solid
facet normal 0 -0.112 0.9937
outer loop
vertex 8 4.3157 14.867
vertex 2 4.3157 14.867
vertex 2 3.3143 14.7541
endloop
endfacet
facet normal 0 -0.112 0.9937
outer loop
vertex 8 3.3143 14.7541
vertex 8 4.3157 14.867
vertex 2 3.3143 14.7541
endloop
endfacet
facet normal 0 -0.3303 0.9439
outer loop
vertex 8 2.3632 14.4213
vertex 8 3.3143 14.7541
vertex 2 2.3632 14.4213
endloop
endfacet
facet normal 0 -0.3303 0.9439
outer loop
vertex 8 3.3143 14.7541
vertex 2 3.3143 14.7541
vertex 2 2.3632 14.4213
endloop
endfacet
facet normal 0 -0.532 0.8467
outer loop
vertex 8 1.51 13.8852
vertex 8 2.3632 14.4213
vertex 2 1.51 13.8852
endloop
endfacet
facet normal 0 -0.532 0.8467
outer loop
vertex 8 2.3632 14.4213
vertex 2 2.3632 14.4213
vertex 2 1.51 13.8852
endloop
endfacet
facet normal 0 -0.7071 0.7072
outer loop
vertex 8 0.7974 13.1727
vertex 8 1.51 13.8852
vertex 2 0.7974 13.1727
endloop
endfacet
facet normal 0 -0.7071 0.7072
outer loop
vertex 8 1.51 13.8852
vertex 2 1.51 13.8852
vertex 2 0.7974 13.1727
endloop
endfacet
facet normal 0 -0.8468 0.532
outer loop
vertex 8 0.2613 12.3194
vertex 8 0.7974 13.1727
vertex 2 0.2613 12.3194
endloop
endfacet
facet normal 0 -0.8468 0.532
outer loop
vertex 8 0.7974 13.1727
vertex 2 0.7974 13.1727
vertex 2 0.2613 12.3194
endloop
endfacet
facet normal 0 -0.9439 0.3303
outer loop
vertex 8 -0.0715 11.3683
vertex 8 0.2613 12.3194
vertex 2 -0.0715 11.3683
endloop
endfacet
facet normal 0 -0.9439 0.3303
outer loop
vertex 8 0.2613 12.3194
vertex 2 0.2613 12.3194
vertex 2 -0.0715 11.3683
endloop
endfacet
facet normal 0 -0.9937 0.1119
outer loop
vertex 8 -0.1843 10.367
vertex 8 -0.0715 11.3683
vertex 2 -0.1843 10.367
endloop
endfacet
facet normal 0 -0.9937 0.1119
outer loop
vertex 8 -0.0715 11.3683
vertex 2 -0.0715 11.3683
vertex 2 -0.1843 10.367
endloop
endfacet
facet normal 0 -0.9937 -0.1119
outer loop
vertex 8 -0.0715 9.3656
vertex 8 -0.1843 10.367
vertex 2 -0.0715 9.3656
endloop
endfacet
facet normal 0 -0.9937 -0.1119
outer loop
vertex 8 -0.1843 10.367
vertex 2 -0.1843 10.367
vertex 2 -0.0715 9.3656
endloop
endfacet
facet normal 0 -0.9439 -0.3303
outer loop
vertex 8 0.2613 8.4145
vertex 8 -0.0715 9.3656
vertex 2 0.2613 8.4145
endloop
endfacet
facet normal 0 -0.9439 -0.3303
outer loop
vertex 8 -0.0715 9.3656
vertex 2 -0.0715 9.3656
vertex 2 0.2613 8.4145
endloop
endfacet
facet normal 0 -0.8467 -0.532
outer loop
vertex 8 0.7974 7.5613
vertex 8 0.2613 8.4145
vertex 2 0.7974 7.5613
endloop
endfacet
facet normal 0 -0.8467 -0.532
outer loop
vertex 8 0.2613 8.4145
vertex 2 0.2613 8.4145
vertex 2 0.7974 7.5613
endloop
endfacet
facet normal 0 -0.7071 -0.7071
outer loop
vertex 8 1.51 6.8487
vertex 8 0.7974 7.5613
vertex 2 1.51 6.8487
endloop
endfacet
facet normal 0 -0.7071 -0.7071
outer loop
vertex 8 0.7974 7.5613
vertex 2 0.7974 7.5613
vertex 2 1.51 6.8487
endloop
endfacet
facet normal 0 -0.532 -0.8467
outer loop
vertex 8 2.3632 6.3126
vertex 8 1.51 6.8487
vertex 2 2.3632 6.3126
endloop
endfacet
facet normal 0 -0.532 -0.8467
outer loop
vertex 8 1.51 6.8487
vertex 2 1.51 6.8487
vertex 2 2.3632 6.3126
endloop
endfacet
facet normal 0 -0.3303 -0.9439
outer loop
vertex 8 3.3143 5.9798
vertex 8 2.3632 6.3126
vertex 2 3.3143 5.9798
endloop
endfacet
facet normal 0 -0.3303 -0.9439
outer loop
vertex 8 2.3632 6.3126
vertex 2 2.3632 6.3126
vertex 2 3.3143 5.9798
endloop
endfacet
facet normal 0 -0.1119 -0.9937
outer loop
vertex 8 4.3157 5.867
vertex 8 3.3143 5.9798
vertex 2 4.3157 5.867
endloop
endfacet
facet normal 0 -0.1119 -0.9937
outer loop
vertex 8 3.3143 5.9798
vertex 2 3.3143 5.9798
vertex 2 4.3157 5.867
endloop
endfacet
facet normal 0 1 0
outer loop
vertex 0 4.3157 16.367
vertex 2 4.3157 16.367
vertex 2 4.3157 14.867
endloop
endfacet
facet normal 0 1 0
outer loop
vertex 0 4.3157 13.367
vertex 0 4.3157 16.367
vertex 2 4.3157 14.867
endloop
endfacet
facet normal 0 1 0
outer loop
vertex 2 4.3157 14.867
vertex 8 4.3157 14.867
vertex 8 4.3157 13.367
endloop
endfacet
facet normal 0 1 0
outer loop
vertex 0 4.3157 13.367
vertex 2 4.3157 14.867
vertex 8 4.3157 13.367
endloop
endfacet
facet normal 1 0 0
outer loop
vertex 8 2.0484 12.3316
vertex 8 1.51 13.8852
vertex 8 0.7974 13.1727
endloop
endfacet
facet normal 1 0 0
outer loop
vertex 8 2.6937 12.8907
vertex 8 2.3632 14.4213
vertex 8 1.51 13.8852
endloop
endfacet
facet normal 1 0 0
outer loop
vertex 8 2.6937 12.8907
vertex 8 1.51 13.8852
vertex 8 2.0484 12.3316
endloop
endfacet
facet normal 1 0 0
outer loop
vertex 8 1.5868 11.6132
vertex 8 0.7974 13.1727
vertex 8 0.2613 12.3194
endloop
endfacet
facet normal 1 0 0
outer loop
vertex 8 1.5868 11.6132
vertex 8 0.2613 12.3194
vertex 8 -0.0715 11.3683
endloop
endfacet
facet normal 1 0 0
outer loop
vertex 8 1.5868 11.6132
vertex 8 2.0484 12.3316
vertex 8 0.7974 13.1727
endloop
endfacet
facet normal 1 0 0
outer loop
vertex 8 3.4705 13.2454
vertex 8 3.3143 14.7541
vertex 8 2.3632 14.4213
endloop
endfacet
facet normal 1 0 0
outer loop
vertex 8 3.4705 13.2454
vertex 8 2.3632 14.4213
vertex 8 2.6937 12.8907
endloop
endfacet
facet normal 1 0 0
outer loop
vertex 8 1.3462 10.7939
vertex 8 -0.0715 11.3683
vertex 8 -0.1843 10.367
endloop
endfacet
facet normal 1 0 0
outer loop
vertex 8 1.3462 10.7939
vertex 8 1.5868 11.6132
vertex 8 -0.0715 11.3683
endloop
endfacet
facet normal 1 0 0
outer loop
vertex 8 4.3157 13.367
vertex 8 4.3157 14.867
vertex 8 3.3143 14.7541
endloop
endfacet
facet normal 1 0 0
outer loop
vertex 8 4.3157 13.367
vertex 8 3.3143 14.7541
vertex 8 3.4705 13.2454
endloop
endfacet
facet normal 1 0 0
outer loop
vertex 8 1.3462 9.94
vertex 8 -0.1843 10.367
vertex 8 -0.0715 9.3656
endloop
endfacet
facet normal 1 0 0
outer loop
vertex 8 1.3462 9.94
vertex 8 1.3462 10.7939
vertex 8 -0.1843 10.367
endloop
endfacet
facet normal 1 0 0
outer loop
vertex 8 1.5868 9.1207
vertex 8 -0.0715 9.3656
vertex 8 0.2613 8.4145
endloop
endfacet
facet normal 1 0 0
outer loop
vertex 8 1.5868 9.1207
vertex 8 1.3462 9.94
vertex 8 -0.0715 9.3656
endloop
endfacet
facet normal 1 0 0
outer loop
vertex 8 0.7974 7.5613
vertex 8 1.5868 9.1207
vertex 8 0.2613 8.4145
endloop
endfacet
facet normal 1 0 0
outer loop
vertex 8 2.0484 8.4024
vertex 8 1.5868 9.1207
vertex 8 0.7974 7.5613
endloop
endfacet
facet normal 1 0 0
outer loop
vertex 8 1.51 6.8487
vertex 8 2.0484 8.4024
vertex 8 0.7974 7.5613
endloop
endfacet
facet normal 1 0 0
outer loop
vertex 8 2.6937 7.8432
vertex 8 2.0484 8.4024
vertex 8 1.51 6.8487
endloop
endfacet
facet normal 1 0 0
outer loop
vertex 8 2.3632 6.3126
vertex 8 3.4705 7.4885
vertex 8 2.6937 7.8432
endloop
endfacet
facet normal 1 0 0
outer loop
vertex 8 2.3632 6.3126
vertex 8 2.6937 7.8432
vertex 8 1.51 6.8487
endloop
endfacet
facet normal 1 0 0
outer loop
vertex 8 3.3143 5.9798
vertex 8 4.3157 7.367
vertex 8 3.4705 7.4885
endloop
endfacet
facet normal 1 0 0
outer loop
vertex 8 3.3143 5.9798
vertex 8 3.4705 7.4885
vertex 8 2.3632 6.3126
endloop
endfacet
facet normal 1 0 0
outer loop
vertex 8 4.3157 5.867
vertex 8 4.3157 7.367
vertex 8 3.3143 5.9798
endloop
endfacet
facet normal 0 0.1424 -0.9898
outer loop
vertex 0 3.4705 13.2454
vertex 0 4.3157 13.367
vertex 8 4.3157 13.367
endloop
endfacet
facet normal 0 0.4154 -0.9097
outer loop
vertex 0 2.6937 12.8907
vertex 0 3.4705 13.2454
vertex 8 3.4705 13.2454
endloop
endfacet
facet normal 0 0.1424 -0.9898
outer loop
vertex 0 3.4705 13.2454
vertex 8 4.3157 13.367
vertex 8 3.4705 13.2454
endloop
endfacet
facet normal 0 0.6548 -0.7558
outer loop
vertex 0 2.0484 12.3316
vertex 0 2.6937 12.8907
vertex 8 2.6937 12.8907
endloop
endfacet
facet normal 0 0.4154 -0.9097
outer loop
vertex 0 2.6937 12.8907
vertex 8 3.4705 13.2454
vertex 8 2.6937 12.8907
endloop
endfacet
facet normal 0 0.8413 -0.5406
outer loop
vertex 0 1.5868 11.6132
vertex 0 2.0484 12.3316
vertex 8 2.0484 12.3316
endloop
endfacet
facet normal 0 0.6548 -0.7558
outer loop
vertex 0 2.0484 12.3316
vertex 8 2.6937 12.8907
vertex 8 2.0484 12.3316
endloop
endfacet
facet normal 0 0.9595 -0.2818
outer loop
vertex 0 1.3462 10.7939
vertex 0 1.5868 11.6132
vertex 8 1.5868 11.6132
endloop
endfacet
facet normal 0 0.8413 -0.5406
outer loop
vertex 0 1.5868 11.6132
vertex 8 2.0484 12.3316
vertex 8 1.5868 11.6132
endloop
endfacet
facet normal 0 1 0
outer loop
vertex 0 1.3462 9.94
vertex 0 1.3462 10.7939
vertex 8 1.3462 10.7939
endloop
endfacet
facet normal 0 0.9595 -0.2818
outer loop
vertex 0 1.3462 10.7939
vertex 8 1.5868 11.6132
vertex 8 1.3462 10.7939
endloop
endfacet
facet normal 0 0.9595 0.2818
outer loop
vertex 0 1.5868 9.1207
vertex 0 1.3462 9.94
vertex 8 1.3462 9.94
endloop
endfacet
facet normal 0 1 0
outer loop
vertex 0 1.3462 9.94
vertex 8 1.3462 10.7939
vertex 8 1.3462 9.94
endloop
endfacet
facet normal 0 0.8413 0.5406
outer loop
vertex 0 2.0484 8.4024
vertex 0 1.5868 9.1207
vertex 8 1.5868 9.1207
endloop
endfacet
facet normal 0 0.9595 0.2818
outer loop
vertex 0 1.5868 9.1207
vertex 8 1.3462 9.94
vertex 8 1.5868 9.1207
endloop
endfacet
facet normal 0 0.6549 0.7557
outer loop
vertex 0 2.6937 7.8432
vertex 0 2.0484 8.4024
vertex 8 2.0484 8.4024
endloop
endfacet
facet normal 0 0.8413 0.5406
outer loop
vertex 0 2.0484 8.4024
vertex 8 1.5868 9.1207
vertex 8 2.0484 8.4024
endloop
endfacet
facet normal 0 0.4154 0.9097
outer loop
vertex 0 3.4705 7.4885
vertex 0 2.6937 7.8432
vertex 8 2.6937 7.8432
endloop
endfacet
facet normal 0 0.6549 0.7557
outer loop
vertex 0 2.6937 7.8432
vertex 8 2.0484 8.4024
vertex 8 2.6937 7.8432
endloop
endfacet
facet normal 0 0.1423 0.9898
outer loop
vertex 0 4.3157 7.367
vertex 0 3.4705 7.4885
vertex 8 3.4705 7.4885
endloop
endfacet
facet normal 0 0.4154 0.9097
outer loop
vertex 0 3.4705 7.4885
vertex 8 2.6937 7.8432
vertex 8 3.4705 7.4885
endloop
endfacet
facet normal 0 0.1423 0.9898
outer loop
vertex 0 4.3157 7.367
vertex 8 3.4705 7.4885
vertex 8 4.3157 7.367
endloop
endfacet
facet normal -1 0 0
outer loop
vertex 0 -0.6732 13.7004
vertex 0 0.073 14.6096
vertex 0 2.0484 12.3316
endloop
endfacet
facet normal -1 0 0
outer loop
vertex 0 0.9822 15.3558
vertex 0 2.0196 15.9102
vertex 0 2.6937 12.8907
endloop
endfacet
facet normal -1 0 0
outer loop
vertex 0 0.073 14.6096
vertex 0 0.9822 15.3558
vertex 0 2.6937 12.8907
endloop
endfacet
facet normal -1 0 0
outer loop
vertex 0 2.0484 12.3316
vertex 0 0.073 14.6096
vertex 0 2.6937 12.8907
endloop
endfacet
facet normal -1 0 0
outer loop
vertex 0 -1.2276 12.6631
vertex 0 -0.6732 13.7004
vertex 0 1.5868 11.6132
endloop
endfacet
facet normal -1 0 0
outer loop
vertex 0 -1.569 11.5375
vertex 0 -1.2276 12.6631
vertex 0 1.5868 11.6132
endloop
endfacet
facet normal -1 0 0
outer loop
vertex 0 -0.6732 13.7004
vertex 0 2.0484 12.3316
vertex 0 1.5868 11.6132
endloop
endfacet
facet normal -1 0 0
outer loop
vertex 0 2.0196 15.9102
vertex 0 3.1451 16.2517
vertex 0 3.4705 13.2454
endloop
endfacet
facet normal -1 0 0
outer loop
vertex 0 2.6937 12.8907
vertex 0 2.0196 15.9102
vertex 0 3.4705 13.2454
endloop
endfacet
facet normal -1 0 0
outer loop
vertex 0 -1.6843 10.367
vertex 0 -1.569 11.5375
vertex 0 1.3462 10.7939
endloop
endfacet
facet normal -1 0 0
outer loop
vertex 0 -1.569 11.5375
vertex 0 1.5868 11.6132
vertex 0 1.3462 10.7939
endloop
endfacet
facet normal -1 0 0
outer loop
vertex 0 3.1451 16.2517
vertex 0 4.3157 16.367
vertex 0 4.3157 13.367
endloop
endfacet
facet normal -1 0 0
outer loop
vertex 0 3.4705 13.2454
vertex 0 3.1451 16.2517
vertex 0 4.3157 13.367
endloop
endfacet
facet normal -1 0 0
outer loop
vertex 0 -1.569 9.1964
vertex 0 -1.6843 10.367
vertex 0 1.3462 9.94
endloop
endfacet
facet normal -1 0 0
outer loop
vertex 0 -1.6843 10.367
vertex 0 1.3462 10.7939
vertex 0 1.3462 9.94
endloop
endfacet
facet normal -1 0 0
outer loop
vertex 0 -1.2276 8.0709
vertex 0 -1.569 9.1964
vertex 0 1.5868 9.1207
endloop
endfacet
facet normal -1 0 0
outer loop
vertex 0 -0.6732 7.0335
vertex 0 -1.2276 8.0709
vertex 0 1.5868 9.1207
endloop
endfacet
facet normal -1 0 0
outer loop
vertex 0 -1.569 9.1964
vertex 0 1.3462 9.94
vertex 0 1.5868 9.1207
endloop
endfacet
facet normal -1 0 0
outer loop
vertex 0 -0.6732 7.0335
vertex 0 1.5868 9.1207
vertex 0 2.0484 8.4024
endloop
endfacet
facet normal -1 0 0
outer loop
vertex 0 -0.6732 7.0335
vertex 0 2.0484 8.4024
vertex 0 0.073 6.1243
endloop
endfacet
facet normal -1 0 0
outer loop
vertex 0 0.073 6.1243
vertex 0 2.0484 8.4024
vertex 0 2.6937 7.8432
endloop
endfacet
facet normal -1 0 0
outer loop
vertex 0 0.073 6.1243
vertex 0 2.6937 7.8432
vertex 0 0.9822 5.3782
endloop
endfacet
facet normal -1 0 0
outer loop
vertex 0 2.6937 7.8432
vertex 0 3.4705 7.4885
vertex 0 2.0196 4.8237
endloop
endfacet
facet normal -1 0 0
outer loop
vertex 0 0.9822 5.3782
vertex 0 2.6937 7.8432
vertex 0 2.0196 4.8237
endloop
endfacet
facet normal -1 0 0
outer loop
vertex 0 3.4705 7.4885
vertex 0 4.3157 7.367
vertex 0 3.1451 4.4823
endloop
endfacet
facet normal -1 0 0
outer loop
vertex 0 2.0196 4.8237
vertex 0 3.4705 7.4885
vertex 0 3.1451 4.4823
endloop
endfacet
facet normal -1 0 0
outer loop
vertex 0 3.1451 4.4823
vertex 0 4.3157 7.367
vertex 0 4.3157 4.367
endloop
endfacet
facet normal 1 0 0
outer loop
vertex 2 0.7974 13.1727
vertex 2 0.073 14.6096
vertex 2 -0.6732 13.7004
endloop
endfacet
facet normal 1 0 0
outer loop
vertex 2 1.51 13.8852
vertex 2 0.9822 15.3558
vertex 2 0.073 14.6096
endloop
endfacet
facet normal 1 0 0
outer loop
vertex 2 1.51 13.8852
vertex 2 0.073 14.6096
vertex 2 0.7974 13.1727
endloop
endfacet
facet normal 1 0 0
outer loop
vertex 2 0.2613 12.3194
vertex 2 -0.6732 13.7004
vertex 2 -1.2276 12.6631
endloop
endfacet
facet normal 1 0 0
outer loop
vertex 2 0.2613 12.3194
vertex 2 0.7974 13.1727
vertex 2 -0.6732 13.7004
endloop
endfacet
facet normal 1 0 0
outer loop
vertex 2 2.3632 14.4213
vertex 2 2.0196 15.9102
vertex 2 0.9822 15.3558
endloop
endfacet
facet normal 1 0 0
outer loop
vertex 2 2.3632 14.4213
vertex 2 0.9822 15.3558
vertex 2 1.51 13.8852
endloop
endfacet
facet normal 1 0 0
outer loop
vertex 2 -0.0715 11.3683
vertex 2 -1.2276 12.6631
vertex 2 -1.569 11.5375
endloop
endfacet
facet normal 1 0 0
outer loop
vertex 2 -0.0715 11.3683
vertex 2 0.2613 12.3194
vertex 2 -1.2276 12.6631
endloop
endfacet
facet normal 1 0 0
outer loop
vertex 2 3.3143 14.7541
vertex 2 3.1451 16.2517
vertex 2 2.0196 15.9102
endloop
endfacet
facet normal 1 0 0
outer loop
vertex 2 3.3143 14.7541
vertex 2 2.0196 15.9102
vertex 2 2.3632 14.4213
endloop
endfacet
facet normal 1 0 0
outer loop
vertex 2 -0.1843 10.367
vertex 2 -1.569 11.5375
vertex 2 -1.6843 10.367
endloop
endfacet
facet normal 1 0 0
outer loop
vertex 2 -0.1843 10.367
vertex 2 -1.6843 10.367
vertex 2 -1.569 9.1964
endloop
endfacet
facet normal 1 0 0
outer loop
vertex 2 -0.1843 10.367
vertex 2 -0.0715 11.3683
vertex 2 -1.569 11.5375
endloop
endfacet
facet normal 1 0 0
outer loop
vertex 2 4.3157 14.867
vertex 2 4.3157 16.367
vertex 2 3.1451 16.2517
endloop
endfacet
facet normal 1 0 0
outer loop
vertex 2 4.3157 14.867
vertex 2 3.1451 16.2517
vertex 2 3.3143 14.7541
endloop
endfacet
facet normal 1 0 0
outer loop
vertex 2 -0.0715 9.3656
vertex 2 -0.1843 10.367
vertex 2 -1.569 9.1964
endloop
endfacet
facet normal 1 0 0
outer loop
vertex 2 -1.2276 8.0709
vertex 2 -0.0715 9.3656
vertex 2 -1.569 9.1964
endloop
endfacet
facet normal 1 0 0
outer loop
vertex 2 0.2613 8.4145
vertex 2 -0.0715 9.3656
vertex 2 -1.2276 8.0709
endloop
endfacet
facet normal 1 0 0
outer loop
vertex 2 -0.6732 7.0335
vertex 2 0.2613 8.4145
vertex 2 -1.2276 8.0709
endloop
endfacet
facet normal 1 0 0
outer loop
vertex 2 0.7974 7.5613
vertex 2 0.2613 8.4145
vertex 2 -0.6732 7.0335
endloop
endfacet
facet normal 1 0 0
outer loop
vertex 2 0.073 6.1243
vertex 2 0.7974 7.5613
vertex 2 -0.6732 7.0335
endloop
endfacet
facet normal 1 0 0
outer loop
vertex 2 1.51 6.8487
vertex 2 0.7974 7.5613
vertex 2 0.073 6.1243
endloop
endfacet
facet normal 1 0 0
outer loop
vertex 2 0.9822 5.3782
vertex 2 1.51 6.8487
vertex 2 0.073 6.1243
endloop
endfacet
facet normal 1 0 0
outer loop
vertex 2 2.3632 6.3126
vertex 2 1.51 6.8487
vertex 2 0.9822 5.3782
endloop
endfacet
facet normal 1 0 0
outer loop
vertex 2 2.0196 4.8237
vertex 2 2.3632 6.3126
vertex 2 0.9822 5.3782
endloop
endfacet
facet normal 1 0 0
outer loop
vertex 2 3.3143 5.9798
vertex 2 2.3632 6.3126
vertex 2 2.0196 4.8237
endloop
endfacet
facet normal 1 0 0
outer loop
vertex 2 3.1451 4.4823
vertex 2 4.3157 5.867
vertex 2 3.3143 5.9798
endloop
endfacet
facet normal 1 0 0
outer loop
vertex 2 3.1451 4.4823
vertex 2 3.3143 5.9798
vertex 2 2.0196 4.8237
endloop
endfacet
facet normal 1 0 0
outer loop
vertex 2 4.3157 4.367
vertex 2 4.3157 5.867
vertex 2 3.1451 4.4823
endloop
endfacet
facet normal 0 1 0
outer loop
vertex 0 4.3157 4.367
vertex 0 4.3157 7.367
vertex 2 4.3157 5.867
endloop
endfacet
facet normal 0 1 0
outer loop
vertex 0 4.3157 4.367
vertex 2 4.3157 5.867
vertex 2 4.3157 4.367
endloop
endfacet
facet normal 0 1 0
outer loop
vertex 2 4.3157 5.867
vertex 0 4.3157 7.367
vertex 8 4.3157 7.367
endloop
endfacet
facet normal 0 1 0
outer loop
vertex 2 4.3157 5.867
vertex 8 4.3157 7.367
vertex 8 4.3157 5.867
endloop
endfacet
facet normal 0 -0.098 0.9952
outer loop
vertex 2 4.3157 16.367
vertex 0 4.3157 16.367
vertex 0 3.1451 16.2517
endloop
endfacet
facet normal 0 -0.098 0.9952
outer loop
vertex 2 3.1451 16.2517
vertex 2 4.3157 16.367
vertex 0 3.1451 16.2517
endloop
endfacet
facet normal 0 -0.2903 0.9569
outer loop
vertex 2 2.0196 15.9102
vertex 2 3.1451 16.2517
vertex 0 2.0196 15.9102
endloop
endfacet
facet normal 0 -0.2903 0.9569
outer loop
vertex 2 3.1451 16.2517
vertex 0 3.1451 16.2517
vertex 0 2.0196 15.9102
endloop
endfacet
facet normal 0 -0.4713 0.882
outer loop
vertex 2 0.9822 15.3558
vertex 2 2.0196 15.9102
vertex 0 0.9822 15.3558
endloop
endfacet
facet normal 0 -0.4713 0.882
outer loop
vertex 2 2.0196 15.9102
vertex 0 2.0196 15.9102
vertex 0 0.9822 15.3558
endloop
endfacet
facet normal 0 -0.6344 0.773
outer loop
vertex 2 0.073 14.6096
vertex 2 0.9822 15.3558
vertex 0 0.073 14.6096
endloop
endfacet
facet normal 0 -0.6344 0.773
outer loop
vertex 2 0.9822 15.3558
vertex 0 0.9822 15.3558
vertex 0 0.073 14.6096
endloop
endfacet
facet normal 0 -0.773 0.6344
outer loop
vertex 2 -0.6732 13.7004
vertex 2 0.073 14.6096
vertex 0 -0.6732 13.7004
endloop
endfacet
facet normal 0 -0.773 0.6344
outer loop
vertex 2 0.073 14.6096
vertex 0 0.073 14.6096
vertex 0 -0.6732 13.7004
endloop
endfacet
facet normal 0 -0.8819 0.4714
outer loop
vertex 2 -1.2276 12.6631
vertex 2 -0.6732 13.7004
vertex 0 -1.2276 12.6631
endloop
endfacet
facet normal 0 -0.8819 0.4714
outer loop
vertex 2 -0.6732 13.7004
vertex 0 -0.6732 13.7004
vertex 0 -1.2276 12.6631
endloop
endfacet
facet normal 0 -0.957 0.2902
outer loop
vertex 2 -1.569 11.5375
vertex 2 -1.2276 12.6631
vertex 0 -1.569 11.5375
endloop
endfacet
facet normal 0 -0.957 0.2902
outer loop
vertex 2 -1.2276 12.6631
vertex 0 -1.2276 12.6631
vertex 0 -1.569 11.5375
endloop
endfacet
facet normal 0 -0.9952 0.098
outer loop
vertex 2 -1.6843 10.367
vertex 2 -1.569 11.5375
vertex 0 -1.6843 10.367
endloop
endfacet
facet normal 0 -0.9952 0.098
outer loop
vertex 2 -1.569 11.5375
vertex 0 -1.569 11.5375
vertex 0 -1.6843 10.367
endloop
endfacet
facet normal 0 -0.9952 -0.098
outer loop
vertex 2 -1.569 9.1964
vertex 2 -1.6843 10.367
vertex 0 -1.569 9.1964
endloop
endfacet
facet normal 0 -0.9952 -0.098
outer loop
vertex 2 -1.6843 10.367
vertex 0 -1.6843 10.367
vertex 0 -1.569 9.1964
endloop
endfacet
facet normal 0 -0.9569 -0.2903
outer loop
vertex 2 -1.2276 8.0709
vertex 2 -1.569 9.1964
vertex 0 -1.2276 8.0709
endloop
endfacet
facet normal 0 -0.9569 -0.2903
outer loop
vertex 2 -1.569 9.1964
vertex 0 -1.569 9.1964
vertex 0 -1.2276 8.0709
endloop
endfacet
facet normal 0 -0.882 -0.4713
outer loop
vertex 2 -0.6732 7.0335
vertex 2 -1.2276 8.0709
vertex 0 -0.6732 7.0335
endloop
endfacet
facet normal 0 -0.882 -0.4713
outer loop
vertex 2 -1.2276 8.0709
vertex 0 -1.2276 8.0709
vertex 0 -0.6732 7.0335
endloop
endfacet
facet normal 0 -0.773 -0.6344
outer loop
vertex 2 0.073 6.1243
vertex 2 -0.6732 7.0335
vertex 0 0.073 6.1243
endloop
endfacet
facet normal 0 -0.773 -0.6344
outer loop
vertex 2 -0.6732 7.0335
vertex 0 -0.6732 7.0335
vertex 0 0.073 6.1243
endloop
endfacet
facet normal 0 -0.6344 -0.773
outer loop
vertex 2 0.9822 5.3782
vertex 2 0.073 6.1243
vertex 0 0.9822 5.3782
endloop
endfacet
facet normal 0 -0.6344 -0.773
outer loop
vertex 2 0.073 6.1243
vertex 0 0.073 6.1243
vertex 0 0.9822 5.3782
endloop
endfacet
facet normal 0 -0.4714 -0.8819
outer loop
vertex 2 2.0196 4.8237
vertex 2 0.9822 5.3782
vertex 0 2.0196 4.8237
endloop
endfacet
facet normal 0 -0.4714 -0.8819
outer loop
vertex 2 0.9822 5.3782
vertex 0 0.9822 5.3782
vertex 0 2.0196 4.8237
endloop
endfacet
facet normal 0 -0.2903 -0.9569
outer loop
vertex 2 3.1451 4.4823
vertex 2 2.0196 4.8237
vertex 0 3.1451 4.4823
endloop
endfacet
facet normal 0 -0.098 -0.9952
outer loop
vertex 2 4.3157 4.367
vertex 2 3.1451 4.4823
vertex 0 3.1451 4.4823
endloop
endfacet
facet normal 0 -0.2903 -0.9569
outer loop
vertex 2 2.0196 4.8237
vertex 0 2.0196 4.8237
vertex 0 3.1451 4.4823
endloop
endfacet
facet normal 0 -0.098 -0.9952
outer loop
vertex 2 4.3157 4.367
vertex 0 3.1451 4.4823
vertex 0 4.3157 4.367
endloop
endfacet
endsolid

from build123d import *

# Parameters (mm, degrees)
SKETCH1_R           = 6
BOSS_EXTRUDE1_DEPTH = 2
SKETCH2_R           = 4.5
BOSS_EXTRUDE2_DEPTH = 6
SKETCH3_R           = 3
CUT_EXTRUDE1_DEPTH  = 11
SKETCH4_W           = 17.898398612
SKETCH4_H           = 8.444372679
CUT_EXTRUDE2_DEPTH  = 11


with BuildPart() as part:
    # Sketch1 → Boss-Extrude1 (new body)
    with BuildSketch(Plane(origin=(0, 0, 0), x_dir=(0, 0, -1), z_dir=(1, 0, 0))):
        with Locations((-10.366970779, 4.315662044)):
            Circle(SKETCH1_R)
    extrude(amount=BOSS_EXTRUDE1_DEPTH)

    # Sketch2 → Boss-Extrude2 (add)
    with BuildSketch(Plane(origin=(2, 0, 0), x_dir=(0, 0, -1), z_dir=(1, 0, 0))):
        with Locations((-10.366970779, 4.315662044)):
            Circle(SKETCH2_R)
    extrude(amount=BOSS_EXTRUDE2_DEPTH)

    # Sketch3 → Cut-Extrude1 (cut)
    with BuildSketch(Plane(origin=(8, 0, 0), x_dir=(0, 0, -1), z_dir=(1, 0, 0))):
        with Locations((-10.366970779, 4.315662044)):
            Circle(SKETCH3_R)
    extrude(amount=-CUT_EXTRUDE1_DEPTH, mode=Mode.SUBTRACT)

    # Sketch4 → Cut-Extrude2 (cut)
    with BuildSketch(Plane(origin=(8, 0, 0), x_dir=(0, 0, -1), z_dir=(1, 0, 0))):
        with Locations((-9.724464162, 8.537848384)):
            Rectangle(SKETCH4_W, SKETCH4_H)
    extrude(amount=-CUT_EXTRUDE2_DEPTH, mode=Mode.SUBTRACT)


solid = part.part
